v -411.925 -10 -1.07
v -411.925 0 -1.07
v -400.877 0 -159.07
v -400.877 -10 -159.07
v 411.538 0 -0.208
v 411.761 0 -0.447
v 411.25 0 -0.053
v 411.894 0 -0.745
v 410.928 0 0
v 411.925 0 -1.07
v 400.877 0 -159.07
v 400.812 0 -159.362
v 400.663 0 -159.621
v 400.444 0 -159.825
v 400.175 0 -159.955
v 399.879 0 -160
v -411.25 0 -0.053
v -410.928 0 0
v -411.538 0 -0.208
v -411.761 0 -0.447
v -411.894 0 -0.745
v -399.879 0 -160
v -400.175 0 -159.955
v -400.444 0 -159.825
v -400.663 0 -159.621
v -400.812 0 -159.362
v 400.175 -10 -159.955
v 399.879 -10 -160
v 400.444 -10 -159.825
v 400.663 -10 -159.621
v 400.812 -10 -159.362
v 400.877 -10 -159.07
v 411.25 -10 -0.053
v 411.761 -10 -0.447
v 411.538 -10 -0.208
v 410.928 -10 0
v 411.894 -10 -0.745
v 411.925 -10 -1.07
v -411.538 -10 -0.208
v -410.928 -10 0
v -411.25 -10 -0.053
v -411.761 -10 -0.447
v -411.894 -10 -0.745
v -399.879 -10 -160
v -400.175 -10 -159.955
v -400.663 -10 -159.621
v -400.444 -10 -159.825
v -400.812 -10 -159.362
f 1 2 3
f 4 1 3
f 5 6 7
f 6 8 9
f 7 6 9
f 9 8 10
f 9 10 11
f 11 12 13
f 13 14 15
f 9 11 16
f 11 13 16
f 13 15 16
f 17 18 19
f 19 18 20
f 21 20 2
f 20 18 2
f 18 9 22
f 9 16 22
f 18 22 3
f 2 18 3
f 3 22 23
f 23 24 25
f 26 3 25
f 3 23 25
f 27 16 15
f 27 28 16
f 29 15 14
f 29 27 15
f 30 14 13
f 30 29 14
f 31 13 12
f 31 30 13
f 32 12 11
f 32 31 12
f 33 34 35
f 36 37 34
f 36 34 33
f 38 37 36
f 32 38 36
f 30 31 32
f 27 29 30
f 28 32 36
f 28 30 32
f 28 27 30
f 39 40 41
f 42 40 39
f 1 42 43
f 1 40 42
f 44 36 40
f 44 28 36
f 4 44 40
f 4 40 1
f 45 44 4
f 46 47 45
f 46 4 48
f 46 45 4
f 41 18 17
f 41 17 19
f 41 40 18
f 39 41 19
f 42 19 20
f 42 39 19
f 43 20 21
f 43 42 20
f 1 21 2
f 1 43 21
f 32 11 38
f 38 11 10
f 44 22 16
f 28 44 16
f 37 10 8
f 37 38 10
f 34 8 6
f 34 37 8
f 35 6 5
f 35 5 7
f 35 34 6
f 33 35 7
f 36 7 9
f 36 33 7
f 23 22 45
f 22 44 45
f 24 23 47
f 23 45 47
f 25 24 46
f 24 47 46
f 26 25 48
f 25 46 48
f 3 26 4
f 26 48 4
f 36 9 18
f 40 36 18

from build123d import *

# Parameters (mm, degrees)
BASE_FLANGE1_DEPTH = 10
FILLET_1_0_R       = 1


# Sheet-metal steps are written as plain solids
with BuildPart() as part:
    # Sketch1 → Base-Flange1 (new body)
    with BuildSketch(Plane(origin=(0, 0, 0), x_dir=(1, 0, 0), z_dir=(0, 1, 0))):
        Polygon((-400.811710089, 160), (400.811710089, 160), (412, 0), (-412, 0), align=None)
    extrude(amount=-BASE_FLANGE1_DEPTH)

    # Fillet-1.0
    fillet_1_0_edges = [part.edges().sort_by_distance(p)[0] for p in [
        (-400.811710089, -5, -160),
        (400.811710089, -5, -160),
        (412, -5, 0),
        (-412, -5, 0),
    ]]
    fillet(fillet_1_0_edges, radius=FILLET_1_0_R)


solid = part.part
